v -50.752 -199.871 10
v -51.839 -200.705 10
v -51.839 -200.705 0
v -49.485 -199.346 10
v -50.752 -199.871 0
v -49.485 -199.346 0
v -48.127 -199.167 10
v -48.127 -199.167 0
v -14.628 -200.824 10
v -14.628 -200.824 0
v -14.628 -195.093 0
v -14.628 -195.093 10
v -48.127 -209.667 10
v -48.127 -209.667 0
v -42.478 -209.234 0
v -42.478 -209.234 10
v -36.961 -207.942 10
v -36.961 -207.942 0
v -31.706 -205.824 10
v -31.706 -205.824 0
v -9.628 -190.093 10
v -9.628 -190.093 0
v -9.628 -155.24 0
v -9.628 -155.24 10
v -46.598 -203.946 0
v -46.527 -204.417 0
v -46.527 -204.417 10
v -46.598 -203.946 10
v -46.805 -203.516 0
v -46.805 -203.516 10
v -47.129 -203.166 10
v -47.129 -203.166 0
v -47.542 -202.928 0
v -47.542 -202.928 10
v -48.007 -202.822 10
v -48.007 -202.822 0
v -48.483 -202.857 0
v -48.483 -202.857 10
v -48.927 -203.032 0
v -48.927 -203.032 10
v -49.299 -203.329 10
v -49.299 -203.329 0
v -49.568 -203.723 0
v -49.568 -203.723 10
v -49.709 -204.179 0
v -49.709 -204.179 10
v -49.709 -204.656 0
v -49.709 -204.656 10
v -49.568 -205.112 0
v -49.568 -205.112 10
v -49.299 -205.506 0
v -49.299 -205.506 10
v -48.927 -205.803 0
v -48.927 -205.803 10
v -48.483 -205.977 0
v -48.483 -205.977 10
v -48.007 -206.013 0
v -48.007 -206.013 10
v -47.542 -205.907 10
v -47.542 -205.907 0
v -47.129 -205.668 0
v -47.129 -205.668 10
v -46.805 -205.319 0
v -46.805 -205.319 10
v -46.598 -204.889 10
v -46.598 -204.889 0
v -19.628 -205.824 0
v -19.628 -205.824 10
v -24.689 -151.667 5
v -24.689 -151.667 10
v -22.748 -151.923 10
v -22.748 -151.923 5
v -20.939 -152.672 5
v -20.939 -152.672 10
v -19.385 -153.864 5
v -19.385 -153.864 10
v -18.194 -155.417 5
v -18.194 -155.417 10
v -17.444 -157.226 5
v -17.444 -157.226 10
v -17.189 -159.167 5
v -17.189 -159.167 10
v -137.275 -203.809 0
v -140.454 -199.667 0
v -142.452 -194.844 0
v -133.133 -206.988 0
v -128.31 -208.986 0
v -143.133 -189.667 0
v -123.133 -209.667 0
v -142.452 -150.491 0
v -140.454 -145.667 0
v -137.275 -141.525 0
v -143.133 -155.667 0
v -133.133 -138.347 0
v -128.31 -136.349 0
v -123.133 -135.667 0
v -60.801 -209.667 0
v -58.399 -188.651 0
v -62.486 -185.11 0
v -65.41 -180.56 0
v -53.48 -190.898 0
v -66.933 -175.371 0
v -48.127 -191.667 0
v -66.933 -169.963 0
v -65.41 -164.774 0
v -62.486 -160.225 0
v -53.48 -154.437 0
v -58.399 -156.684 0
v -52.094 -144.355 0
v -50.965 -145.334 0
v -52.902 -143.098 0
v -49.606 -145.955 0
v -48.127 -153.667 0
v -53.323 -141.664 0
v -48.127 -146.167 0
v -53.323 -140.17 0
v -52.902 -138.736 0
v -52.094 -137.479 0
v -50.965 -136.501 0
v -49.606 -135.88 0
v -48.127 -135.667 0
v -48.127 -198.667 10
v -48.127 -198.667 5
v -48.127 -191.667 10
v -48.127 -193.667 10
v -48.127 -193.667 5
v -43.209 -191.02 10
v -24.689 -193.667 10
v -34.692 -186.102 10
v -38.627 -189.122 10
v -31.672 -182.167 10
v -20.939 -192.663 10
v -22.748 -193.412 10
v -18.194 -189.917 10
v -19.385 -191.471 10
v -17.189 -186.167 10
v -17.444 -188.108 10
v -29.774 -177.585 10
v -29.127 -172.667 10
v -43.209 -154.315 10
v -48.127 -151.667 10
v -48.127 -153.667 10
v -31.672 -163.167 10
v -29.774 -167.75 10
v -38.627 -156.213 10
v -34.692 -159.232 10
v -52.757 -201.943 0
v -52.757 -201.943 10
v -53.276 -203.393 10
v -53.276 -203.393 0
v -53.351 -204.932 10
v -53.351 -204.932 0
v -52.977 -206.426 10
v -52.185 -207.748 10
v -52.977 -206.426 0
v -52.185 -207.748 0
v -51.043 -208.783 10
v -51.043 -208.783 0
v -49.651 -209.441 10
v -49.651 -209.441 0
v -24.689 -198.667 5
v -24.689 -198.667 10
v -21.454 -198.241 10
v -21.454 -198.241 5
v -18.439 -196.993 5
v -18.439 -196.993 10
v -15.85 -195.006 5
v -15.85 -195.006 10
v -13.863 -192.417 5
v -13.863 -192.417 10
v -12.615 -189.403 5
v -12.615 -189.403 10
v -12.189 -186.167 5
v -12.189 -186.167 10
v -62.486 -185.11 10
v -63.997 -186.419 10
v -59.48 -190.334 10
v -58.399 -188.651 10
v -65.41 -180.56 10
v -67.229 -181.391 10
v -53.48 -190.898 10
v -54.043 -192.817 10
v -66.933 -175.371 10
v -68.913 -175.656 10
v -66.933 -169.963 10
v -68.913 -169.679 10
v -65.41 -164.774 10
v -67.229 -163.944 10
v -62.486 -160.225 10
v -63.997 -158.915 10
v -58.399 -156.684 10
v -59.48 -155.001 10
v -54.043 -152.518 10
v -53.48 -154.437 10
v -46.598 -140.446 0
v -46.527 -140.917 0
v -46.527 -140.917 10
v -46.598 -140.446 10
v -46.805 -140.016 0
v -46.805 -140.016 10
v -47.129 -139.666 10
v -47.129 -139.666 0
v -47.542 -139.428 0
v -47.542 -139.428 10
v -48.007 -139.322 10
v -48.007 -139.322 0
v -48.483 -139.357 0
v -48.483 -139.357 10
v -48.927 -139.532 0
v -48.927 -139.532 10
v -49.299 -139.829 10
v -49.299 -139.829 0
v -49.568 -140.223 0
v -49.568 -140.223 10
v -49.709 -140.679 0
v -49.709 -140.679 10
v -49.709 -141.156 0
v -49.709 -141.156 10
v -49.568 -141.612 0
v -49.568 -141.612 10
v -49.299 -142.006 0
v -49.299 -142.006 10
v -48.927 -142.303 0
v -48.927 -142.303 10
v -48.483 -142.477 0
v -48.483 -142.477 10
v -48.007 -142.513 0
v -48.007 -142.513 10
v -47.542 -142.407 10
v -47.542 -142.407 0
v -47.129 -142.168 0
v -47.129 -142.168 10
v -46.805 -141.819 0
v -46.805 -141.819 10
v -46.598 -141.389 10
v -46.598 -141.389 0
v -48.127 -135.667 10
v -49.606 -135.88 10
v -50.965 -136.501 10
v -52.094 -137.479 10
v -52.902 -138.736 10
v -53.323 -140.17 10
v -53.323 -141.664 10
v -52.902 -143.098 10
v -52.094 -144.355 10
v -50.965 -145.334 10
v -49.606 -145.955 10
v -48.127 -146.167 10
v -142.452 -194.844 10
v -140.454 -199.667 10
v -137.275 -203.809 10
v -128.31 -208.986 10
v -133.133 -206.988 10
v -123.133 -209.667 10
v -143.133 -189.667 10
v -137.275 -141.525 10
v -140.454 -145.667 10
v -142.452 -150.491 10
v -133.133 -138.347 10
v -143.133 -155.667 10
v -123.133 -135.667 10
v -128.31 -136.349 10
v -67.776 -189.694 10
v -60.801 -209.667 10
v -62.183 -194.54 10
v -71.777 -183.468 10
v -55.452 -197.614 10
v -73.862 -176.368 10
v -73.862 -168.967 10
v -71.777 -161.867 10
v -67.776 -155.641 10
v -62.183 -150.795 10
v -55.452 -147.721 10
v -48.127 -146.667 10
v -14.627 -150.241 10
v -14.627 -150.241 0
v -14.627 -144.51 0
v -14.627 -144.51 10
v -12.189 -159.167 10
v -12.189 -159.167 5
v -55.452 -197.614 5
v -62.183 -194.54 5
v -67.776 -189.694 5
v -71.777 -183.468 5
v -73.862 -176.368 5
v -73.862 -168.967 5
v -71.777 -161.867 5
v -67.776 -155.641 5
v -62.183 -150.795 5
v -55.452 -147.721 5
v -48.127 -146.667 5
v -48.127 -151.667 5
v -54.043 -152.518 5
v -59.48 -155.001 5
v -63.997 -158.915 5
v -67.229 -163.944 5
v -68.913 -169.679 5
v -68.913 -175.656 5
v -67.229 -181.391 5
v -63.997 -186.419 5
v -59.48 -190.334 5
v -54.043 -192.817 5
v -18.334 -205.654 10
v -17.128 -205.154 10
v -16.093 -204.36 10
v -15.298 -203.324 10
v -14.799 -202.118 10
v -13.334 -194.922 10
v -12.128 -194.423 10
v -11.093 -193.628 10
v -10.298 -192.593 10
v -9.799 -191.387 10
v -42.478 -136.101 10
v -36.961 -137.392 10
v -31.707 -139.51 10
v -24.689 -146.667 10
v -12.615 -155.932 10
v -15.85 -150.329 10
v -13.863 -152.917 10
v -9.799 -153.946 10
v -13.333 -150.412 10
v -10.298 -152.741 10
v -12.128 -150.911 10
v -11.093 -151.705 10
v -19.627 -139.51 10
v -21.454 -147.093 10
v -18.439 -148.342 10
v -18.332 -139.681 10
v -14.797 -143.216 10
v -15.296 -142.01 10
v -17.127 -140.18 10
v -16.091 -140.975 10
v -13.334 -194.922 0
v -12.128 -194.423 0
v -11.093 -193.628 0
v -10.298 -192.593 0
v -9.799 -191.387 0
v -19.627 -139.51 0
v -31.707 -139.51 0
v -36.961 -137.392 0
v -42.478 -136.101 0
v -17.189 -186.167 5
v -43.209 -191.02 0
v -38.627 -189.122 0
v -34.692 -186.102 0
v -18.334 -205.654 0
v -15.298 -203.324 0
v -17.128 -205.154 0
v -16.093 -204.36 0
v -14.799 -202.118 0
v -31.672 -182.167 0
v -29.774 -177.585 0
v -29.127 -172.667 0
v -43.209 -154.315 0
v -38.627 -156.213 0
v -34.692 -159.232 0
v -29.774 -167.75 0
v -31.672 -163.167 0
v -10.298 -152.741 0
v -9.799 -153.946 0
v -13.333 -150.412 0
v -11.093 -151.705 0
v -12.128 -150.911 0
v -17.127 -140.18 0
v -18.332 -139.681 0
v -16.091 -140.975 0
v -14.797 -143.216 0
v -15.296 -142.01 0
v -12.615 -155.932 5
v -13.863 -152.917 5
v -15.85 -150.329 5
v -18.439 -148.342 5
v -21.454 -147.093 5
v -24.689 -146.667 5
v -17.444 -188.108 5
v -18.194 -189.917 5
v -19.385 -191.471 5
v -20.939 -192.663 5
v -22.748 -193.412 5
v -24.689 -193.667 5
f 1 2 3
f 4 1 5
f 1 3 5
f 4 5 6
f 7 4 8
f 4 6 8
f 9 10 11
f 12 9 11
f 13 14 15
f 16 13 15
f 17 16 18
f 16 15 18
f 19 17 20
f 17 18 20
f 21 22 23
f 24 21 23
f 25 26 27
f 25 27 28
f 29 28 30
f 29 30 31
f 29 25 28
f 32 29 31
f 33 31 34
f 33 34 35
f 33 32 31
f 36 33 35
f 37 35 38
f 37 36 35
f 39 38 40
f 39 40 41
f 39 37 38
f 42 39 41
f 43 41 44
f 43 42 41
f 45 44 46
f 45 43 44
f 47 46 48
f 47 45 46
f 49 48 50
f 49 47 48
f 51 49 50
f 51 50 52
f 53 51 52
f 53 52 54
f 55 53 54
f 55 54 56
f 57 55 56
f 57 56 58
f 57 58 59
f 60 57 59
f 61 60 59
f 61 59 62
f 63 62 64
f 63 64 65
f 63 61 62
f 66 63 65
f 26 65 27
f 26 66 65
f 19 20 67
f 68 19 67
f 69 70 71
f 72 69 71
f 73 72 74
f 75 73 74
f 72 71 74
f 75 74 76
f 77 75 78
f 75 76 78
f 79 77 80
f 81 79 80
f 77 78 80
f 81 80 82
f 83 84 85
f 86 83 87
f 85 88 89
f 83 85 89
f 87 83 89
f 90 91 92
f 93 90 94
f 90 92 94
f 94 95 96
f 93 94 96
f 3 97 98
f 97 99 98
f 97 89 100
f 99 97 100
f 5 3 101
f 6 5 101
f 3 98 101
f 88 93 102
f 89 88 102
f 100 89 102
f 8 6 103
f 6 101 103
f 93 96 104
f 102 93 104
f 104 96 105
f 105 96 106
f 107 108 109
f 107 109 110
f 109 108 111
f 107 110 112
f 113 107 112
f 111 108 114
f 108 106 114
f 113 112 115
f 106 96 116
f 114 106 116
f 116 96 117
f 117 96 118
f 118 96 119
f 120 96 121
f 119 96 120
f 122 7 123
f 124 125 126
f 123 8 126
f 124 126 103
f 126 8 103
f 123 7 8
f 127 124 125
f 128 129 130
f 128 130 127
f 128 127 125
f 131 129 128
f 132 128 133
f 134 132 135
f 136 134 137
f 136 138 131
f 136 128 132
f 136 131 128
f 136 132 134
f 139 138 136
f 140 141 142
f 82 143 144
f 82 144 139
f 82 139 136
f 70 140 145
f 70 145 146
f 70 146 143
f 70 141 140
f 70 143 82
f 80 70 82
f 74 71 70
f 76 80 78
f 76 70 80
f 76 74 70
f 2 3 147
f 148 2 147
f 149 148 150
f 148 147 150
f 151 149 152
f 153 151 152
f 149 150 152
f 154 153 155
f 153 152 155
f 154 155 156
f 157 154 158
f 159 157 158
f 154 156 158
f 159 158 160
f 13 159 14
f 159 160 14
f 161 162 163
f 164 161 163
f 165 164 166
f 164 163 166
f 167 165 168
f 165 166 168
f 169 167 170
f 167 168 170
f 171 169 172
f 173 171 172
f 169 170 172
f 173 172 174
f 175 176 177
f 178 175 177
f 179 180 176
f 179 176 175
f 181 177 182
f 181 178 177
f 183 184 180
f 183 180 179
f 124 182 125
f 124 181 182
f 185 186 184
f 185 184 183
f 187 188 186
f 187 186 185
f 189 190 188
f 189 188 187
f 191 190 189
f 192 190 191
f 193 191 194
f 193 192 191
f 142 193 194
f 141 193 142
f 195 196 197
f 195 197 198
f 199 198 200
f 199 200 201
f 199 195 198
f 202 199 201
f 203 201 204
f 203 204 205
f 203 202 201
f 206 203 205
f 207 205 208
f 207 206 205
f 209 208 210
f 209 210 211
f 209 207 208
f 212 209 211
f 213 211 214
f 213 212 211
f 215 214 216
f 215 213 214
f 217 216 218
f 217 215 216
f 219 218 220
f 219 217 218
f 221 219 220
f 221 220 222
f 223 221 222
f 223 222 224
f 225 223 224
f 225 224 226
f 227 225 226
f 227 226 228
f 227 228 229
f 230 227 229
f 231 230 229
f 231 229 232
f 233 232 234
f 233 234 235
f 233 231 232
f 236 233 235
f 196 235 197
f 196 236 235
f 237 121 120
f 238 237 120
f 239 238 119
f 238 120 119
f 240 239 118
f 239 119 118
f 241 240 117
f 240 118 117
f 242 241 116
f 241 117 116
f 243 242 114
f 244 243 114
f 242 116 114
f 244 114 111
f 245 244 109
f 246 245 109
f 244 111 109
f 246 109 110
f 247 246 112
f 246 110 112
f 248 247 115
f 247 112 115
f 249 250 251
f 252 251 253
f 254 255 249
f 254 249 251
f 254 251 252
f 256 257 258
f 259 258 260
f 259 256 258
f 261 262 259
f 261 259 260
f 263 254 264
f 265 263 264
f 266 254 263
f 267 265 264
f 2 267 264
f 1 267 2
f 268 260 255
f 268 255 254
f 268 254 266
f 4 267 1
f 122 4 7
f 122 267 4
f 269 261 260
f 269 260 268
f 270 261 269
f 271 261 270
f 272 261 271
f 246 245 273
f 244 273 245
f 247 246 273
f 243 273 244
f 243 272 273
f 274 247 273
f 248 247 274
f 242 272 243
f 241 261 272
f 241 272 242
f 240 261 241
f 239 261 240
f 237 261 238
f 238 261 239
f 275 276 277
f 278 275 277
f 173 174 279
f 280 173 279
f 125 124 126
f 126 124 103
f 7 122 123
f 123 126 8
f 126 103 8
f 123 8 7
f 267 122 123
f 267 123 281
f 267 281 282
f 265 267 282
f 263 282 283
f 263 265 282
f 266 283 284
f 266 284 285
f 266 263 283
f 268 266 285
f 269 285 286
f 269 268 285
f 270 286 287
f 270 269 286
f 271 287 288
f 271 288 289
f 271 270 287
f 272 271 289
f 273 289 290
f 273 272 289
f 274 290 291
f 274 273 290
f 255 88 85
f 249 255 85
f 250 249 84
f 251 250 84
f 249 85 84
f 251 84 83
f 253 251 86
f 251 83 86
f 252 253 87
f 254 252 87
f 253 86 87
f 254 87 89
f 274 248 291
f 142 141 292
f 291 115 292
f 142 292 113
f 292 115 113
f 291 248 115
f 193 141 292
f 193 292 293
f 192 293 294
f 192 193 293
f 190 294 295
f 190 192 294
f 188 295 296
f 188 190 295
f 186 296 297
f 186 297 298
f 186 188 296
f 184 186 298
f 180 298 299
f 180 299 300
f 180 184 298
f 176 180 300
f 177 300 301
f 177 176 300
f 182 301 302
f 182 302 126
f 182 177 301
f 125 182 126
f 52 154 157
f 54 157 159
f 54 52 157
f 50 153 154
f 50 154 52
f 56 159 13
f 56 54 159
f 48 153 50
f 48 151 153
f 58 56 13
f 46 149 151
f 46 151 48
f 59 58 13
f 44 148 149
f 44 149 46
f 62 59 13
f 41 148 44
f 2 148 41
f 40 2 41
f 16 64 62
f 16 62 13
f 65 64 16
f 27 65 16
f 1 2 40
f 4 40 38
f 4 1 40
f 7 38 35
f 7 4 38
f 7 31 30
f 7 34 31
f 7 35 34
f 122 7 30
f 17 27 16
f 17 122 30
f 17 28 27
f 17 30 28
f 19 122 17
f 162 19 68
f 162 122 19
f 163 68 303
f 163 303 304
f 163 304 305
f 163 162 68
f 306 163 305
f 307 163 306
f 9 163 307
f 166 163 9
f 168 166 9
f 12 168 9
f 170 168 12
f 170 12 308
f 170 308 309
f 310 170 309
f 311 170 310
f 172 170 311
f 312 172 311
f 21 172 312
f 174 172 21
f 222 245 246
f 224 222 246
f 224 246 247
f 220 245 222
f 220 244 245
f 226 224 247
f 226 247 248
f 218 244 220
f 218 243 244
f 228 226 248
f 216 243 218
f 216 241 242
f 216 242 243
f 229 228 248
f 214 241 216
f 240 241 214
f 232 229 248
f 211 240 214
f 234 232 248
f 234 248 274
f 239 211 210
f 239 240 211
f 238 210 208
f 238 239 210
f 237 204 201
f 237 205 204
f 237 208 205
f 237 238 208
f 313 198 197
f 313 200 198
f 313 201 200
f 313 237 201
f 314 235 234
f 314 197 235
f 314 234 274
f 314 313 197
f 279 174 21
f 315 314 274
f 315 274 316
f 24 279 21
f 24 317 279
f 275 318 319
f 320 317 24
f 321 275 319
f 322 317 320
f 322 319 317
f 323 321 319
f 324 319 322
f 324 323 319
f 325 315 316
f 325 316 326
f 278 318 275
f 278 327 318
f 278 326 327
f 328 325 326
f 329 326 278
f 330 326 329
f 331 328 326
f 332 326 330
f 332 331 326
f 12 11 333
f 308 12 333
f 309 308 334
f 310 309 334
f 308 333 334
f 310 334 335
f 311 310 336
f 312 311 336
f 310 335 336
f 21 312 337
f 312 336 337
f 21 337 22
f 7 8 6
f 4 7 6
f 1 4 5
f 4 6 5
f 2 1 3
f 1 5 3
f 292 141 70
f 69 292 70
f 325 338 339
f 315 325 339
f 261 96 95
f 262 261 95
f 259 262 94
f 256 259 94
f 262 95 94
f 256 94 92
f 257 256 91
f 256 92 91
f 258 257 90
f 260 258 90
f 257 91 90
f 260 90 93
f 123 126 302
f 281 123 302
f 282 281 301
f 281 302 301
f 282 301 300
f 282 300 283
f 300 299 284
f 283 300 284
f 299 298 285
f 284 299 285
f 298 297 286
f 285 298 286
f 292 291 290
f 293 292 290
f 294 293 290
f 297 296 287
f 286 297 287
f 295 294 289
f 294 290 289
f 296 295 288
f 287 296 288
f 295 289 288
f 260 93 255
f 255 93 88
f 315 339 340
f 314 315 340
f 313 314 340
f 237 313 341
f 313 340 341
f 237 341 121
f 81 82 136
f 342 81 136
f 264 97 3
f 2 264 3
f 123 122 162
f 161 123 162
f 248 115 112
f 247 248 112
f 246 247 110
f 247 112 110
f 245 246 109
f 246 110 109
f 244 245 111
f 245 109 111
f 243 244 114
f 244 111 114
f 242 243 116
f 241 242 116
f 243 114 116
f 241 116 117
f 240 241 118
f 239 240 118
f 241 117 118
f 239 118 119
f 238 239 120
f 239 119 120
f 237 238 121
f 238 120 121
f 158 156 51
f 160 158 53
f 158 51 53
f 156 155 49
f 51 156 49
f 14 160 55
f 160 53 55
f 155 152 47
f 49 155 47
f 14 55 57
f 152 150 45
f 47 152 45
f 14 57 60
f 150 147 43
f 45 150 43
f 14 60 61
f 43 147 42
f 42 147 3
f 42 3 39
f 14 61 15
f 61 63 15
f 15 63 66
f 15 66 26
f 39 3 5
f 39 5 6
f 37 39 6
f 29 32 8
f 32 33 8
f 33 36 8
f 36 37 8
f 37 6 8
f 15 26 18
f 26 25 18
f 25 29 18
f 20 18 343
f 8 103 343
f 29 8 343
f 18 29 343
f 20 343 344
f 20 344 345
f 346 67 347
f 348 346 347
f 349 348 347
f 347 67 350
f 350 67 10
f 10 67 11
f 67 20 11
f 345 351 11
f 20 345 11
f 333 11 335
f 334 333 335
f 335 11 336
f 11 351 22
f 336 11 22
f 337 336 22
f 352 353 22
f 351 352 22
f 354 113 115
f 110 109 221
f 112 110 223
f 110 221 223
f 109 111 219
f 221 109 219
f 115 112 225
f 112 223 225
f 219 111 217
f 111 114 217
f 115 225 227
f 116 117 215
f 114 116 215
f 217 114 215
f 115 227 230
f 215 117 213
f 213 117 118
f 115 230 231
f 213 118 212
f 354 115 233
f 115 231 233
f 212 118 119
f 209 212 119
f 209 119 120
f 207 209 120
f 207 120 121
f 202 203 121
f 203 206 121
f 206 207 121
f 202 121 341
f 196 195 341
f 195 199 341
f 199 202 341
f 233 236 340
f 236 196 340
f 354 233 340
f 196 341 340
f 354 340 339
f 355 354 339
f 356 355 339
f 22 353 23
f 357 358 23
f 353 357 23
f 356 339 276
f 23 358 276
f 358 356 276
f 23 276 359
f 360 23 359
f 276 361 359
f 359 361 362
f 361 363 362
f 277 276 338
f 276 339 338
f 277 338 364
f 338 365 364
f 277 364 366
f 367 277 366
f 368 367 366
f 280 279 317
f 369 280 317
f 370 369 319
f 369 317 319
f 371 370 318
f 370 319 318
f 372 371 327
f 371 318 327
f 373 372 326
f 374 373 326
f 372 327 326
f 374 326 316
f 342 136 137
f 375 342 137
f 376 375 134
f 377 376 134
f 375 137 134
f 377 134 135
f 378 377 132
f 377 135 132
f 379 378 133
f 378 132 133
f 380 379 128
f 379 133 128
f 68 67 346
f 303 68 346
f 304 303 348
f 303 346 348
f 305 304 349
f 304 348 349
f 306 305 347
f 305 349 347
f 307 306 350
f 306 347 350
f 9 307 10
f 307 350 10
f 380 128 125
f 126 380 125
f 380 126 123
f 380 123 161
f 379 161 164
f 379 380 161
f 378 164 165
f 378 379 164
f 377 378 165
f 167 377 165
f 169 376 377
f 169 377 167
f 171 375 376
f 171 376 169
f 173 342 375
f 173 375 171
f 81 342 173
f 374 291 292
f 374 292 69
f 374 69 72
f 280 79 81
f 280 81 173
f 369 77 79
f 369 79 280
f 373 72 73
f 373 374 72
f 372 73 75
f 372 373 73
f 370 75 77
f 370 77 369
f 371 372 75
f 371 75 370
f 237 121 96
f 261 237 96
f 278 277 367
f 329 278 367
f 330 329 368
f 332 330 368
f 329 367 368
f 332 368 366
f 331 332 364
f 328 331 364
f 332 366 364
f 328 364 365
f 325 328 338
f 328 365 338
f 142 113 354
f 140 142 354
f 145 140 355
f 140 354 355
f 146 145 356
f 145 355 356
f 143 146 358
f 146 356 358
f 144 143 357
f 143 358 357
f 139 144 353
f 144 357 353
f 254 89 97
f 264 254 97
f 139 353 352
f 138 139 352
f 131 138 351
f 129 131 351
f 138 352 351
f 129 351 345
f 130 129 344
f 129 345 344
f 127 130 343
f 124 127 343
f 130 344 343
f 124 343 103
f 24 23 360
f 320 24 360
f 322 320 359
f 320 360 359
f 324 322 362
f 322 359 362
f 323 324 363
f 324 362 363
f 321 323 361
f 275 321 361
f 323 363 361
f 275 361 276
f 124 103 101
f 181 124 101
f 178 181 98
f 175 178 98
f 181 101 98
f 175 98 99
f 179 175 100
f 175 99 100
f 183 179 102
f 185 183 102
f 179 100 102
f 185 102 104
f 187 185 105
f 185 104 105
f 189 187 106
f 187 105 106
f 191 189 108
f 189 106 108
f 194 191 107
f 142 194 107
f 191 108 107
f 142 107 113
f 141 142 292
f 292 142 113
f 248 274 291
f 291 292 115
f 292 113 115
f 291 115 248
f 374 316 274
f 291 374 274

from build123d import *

# Parameters (mm, degrees)
SKETCH1_R           = 1.6
BOSS_EXTRUDE1_DEPTH = 10
BOSS_EXTRUDE2_DEPTH = 10
CUT_EXTRUDE3_DEPTH  = 5
CUT_EXTRUDE4_DEPTH  = 5


with BuildPart() as part:
    # Sketch1 → Boss-Extrude1 (new body)
    with BuildSketch(Plane.XY):
        with BuildLine():
            ThreePointArc((-48.126591176, -199.167340501), (-50.135679618, -199.566972948), (-51.838902692, -200.7050299))
            ThreePointArc((-51.838902692, -200.7050299), (-52.976960936, -206.426431151), (-48.126591176, -209.667344916))
            ThreePointArc((-48.126591176, -209.667344916), (-39.694447805, -208.6937098), (-31.706079023, -205.824045816))
            Line((-31.706079023, -205.824045816), (-19.628209226, -205.824045816))
            ThreePointArc((-19.628209226, -205.824045816), (-16.09267532, -204.359579722), (-14.628209226, -200.824045816))
            Line((-14.628209226, -200.824045816), (-14.628209226, -195.09257804))
            ThreePointArc((-14.628209226, -195.09257804), (-11.09267532, -193.628111946), (-9.628209226, -190.09257804))
            Line((-9.628209226, -190.09257804), (-9.628209226, -155.239636863))
            ThreePointArc((-9.628209226, -155.239636863), (-11.092539014, -151.705471905), (-14.626591176, -150.240869913))
            Line((-14.626591176, -150.240869913), (-14.626591176, -144.510294404))
            ThreePointArc((-14.626591176, -144.510294404), (-16.09105727, -140.974760498), (-19.626591176, -139.510294404))
            Line((-19.626591176, -139.510294404), (-31.706777105, -139.510294404))
            ThreePointArc((-31.706777105, -139.510294404), (-39.694826995, -136.640886987), (-48.126591176, -135.667340501))
            ThreePointArc((-48.126591176, -135.667340501), (-53.376591176, -140.917340501), (-48.126591176, -146.167340501))
            Line((-48.126591176, -146.167340501), (-48.126591176, -153.667340501))
            ThreePointArc((-48.126591176, -153.667340501), (-34.691562334, -159.232311659), (-29.126591176, -172.667340501))
            ThreePointArc((-29.126591176, -172.667340501), (-34.691562334, -186.102369344), (-48.126591176, -191.667340501))
            Line((-48.126591176, -191.667340501), (-48.126591176, -199.167340501))
        make_face()
        with Locations((-48.126591176, -204.417342709)):
            Circle(SKETCH1_R, mode=Mode.SUBTRACT)
        with Locations((-48.126591176, -140.917340501)):
            Circle(SKETCH1_R, mode=Mode.SUBTRACT)
    extrude(amount=BOSS_EXTRUDE1_DEPTH)

    # Sketch5 → Cut-Extrude4 (cut)
    with BuildSketch(Plane.XY.offset(10)):
        with BuildLine():
            Line((-48.126591176, -193.667340501), (-48.126591176, -198.667340501))
            Line((-48.126591176, -198.667340501), (-24.688746804, -198.667340501))
            ThreePointArc((-24.688746804, -198.667340501), (-15.849912039, -195.006175266), (-12.188746804, -186.167340501))
            Line((-12.188746804, -186.167340501), (-12.188746804, -159.167340501))
            ThreePointArc((-12.188746804, -159.167340501), (-15.849912039, -150.328505736), (-24.688746804, -146.667340501))
            Line((-24.688746804, -146.667340501), (-48.126591176, -146.667340501))
            Line((-48.126591176, -146.667340501), (-48.126591176, -151.667340501))
            Line((-48.126591176, -151.667340501), (-24.688746804, -151.667340501))
            ThreePointArc((-24.688746804, -151.667340501), (-19.385445945, -153.864039642), (-17.188746804, -159.167340501))
            Line((-17.188746804, -159.167340501), (-17.188746804, -186.167340501))
            ThreePointArc((-17.188746804, -186.167340501), (-19.385445945, -191.47064136), (-24.688746804, -193.667340501))
            Line((-24.688746804, -193.667340501), (-48.126591176, -193.667340501))
        make_face()
    extrude(amount=-CUT_EXTRUDE4_DEPTH, mode=Mode.SUBTRACT)


with BuildPart() as body_2:
    # Sketch1<6> → Boss-Extrude2 (new body)
    with BuildSketch(Plane.XY):
        with BuildLine():
            Line((-60.80122083, -209.667344916), (-51.838902692, -200.7050299))
            ThreePointArc((-51.838902692, -200.7050299), (-50.135679618, -199.566972948), (-48.126591176, -199.167340501))
            Line((-48.126591176, -199.167340501), (-48.126591176, -191.667340501))
            ThreePointArc((-48.126591176, -191.667340501), (-67.126591176, -172.667340501), (-48.126591176, -153.667340501))
            Line((-48.126591176, -153.667340501), (-48.126591176, -146.167340501))
            ThreePointArc((-48.126591176, -146.167340501), (-53.376591176, -140.917340501), (-48.126591176, -135.667340501))
            Line((-48.126591176, -135.667340501), (-123.133338168, -135.667340501))
            ThreePointArc((-123.133338168, -135.667340501), (-137.275475586, -141.525206282), (-143.133338225, -155.667345001))
            Line((-143.133338225, -155.667345001), (-143.133338225, -189.667345001))
            ThreePointArc((-143.133338225, -189.667345001), (-137.275473788, -203.8094806), (-123.13333814, -209.667344916))
            Line((-123.13333814, -209.667344916), (-60.80122083, -209.667344916))
        make_face()
    extrude(amount=BOSS_EXTRUDE2_DEPTH)

    # Sketch2 → Cut-Extrude3 (cut)
    with BuildSketch(Plane(origin=(0, 0, 10), x_dir=(-1, 0, 0), z_dir=(0, 0, -1))):
        with BuildLine():
            Line((48.126591176, -146.667340501), (48.126591176, -151.667340501))
            ThreePointArc((48.126591176, -151.667340501), (69.126591176, -172.667340501), (48.126591176, -193.667340501))
            Line((48.126591176, -193.667340501), (48.126591176, -198.667340501))
            ThreePointArc((48.126591176, -198.667340501), (74.126591176, -172.667340501), (48.126591176, -146.667340501))
        make_face()
    extrude(amount=CUT_EXTRUDE3_DEPTH, mode=Mode.SUBTRACT)


solid = Compound([part.part, body_2.part])
